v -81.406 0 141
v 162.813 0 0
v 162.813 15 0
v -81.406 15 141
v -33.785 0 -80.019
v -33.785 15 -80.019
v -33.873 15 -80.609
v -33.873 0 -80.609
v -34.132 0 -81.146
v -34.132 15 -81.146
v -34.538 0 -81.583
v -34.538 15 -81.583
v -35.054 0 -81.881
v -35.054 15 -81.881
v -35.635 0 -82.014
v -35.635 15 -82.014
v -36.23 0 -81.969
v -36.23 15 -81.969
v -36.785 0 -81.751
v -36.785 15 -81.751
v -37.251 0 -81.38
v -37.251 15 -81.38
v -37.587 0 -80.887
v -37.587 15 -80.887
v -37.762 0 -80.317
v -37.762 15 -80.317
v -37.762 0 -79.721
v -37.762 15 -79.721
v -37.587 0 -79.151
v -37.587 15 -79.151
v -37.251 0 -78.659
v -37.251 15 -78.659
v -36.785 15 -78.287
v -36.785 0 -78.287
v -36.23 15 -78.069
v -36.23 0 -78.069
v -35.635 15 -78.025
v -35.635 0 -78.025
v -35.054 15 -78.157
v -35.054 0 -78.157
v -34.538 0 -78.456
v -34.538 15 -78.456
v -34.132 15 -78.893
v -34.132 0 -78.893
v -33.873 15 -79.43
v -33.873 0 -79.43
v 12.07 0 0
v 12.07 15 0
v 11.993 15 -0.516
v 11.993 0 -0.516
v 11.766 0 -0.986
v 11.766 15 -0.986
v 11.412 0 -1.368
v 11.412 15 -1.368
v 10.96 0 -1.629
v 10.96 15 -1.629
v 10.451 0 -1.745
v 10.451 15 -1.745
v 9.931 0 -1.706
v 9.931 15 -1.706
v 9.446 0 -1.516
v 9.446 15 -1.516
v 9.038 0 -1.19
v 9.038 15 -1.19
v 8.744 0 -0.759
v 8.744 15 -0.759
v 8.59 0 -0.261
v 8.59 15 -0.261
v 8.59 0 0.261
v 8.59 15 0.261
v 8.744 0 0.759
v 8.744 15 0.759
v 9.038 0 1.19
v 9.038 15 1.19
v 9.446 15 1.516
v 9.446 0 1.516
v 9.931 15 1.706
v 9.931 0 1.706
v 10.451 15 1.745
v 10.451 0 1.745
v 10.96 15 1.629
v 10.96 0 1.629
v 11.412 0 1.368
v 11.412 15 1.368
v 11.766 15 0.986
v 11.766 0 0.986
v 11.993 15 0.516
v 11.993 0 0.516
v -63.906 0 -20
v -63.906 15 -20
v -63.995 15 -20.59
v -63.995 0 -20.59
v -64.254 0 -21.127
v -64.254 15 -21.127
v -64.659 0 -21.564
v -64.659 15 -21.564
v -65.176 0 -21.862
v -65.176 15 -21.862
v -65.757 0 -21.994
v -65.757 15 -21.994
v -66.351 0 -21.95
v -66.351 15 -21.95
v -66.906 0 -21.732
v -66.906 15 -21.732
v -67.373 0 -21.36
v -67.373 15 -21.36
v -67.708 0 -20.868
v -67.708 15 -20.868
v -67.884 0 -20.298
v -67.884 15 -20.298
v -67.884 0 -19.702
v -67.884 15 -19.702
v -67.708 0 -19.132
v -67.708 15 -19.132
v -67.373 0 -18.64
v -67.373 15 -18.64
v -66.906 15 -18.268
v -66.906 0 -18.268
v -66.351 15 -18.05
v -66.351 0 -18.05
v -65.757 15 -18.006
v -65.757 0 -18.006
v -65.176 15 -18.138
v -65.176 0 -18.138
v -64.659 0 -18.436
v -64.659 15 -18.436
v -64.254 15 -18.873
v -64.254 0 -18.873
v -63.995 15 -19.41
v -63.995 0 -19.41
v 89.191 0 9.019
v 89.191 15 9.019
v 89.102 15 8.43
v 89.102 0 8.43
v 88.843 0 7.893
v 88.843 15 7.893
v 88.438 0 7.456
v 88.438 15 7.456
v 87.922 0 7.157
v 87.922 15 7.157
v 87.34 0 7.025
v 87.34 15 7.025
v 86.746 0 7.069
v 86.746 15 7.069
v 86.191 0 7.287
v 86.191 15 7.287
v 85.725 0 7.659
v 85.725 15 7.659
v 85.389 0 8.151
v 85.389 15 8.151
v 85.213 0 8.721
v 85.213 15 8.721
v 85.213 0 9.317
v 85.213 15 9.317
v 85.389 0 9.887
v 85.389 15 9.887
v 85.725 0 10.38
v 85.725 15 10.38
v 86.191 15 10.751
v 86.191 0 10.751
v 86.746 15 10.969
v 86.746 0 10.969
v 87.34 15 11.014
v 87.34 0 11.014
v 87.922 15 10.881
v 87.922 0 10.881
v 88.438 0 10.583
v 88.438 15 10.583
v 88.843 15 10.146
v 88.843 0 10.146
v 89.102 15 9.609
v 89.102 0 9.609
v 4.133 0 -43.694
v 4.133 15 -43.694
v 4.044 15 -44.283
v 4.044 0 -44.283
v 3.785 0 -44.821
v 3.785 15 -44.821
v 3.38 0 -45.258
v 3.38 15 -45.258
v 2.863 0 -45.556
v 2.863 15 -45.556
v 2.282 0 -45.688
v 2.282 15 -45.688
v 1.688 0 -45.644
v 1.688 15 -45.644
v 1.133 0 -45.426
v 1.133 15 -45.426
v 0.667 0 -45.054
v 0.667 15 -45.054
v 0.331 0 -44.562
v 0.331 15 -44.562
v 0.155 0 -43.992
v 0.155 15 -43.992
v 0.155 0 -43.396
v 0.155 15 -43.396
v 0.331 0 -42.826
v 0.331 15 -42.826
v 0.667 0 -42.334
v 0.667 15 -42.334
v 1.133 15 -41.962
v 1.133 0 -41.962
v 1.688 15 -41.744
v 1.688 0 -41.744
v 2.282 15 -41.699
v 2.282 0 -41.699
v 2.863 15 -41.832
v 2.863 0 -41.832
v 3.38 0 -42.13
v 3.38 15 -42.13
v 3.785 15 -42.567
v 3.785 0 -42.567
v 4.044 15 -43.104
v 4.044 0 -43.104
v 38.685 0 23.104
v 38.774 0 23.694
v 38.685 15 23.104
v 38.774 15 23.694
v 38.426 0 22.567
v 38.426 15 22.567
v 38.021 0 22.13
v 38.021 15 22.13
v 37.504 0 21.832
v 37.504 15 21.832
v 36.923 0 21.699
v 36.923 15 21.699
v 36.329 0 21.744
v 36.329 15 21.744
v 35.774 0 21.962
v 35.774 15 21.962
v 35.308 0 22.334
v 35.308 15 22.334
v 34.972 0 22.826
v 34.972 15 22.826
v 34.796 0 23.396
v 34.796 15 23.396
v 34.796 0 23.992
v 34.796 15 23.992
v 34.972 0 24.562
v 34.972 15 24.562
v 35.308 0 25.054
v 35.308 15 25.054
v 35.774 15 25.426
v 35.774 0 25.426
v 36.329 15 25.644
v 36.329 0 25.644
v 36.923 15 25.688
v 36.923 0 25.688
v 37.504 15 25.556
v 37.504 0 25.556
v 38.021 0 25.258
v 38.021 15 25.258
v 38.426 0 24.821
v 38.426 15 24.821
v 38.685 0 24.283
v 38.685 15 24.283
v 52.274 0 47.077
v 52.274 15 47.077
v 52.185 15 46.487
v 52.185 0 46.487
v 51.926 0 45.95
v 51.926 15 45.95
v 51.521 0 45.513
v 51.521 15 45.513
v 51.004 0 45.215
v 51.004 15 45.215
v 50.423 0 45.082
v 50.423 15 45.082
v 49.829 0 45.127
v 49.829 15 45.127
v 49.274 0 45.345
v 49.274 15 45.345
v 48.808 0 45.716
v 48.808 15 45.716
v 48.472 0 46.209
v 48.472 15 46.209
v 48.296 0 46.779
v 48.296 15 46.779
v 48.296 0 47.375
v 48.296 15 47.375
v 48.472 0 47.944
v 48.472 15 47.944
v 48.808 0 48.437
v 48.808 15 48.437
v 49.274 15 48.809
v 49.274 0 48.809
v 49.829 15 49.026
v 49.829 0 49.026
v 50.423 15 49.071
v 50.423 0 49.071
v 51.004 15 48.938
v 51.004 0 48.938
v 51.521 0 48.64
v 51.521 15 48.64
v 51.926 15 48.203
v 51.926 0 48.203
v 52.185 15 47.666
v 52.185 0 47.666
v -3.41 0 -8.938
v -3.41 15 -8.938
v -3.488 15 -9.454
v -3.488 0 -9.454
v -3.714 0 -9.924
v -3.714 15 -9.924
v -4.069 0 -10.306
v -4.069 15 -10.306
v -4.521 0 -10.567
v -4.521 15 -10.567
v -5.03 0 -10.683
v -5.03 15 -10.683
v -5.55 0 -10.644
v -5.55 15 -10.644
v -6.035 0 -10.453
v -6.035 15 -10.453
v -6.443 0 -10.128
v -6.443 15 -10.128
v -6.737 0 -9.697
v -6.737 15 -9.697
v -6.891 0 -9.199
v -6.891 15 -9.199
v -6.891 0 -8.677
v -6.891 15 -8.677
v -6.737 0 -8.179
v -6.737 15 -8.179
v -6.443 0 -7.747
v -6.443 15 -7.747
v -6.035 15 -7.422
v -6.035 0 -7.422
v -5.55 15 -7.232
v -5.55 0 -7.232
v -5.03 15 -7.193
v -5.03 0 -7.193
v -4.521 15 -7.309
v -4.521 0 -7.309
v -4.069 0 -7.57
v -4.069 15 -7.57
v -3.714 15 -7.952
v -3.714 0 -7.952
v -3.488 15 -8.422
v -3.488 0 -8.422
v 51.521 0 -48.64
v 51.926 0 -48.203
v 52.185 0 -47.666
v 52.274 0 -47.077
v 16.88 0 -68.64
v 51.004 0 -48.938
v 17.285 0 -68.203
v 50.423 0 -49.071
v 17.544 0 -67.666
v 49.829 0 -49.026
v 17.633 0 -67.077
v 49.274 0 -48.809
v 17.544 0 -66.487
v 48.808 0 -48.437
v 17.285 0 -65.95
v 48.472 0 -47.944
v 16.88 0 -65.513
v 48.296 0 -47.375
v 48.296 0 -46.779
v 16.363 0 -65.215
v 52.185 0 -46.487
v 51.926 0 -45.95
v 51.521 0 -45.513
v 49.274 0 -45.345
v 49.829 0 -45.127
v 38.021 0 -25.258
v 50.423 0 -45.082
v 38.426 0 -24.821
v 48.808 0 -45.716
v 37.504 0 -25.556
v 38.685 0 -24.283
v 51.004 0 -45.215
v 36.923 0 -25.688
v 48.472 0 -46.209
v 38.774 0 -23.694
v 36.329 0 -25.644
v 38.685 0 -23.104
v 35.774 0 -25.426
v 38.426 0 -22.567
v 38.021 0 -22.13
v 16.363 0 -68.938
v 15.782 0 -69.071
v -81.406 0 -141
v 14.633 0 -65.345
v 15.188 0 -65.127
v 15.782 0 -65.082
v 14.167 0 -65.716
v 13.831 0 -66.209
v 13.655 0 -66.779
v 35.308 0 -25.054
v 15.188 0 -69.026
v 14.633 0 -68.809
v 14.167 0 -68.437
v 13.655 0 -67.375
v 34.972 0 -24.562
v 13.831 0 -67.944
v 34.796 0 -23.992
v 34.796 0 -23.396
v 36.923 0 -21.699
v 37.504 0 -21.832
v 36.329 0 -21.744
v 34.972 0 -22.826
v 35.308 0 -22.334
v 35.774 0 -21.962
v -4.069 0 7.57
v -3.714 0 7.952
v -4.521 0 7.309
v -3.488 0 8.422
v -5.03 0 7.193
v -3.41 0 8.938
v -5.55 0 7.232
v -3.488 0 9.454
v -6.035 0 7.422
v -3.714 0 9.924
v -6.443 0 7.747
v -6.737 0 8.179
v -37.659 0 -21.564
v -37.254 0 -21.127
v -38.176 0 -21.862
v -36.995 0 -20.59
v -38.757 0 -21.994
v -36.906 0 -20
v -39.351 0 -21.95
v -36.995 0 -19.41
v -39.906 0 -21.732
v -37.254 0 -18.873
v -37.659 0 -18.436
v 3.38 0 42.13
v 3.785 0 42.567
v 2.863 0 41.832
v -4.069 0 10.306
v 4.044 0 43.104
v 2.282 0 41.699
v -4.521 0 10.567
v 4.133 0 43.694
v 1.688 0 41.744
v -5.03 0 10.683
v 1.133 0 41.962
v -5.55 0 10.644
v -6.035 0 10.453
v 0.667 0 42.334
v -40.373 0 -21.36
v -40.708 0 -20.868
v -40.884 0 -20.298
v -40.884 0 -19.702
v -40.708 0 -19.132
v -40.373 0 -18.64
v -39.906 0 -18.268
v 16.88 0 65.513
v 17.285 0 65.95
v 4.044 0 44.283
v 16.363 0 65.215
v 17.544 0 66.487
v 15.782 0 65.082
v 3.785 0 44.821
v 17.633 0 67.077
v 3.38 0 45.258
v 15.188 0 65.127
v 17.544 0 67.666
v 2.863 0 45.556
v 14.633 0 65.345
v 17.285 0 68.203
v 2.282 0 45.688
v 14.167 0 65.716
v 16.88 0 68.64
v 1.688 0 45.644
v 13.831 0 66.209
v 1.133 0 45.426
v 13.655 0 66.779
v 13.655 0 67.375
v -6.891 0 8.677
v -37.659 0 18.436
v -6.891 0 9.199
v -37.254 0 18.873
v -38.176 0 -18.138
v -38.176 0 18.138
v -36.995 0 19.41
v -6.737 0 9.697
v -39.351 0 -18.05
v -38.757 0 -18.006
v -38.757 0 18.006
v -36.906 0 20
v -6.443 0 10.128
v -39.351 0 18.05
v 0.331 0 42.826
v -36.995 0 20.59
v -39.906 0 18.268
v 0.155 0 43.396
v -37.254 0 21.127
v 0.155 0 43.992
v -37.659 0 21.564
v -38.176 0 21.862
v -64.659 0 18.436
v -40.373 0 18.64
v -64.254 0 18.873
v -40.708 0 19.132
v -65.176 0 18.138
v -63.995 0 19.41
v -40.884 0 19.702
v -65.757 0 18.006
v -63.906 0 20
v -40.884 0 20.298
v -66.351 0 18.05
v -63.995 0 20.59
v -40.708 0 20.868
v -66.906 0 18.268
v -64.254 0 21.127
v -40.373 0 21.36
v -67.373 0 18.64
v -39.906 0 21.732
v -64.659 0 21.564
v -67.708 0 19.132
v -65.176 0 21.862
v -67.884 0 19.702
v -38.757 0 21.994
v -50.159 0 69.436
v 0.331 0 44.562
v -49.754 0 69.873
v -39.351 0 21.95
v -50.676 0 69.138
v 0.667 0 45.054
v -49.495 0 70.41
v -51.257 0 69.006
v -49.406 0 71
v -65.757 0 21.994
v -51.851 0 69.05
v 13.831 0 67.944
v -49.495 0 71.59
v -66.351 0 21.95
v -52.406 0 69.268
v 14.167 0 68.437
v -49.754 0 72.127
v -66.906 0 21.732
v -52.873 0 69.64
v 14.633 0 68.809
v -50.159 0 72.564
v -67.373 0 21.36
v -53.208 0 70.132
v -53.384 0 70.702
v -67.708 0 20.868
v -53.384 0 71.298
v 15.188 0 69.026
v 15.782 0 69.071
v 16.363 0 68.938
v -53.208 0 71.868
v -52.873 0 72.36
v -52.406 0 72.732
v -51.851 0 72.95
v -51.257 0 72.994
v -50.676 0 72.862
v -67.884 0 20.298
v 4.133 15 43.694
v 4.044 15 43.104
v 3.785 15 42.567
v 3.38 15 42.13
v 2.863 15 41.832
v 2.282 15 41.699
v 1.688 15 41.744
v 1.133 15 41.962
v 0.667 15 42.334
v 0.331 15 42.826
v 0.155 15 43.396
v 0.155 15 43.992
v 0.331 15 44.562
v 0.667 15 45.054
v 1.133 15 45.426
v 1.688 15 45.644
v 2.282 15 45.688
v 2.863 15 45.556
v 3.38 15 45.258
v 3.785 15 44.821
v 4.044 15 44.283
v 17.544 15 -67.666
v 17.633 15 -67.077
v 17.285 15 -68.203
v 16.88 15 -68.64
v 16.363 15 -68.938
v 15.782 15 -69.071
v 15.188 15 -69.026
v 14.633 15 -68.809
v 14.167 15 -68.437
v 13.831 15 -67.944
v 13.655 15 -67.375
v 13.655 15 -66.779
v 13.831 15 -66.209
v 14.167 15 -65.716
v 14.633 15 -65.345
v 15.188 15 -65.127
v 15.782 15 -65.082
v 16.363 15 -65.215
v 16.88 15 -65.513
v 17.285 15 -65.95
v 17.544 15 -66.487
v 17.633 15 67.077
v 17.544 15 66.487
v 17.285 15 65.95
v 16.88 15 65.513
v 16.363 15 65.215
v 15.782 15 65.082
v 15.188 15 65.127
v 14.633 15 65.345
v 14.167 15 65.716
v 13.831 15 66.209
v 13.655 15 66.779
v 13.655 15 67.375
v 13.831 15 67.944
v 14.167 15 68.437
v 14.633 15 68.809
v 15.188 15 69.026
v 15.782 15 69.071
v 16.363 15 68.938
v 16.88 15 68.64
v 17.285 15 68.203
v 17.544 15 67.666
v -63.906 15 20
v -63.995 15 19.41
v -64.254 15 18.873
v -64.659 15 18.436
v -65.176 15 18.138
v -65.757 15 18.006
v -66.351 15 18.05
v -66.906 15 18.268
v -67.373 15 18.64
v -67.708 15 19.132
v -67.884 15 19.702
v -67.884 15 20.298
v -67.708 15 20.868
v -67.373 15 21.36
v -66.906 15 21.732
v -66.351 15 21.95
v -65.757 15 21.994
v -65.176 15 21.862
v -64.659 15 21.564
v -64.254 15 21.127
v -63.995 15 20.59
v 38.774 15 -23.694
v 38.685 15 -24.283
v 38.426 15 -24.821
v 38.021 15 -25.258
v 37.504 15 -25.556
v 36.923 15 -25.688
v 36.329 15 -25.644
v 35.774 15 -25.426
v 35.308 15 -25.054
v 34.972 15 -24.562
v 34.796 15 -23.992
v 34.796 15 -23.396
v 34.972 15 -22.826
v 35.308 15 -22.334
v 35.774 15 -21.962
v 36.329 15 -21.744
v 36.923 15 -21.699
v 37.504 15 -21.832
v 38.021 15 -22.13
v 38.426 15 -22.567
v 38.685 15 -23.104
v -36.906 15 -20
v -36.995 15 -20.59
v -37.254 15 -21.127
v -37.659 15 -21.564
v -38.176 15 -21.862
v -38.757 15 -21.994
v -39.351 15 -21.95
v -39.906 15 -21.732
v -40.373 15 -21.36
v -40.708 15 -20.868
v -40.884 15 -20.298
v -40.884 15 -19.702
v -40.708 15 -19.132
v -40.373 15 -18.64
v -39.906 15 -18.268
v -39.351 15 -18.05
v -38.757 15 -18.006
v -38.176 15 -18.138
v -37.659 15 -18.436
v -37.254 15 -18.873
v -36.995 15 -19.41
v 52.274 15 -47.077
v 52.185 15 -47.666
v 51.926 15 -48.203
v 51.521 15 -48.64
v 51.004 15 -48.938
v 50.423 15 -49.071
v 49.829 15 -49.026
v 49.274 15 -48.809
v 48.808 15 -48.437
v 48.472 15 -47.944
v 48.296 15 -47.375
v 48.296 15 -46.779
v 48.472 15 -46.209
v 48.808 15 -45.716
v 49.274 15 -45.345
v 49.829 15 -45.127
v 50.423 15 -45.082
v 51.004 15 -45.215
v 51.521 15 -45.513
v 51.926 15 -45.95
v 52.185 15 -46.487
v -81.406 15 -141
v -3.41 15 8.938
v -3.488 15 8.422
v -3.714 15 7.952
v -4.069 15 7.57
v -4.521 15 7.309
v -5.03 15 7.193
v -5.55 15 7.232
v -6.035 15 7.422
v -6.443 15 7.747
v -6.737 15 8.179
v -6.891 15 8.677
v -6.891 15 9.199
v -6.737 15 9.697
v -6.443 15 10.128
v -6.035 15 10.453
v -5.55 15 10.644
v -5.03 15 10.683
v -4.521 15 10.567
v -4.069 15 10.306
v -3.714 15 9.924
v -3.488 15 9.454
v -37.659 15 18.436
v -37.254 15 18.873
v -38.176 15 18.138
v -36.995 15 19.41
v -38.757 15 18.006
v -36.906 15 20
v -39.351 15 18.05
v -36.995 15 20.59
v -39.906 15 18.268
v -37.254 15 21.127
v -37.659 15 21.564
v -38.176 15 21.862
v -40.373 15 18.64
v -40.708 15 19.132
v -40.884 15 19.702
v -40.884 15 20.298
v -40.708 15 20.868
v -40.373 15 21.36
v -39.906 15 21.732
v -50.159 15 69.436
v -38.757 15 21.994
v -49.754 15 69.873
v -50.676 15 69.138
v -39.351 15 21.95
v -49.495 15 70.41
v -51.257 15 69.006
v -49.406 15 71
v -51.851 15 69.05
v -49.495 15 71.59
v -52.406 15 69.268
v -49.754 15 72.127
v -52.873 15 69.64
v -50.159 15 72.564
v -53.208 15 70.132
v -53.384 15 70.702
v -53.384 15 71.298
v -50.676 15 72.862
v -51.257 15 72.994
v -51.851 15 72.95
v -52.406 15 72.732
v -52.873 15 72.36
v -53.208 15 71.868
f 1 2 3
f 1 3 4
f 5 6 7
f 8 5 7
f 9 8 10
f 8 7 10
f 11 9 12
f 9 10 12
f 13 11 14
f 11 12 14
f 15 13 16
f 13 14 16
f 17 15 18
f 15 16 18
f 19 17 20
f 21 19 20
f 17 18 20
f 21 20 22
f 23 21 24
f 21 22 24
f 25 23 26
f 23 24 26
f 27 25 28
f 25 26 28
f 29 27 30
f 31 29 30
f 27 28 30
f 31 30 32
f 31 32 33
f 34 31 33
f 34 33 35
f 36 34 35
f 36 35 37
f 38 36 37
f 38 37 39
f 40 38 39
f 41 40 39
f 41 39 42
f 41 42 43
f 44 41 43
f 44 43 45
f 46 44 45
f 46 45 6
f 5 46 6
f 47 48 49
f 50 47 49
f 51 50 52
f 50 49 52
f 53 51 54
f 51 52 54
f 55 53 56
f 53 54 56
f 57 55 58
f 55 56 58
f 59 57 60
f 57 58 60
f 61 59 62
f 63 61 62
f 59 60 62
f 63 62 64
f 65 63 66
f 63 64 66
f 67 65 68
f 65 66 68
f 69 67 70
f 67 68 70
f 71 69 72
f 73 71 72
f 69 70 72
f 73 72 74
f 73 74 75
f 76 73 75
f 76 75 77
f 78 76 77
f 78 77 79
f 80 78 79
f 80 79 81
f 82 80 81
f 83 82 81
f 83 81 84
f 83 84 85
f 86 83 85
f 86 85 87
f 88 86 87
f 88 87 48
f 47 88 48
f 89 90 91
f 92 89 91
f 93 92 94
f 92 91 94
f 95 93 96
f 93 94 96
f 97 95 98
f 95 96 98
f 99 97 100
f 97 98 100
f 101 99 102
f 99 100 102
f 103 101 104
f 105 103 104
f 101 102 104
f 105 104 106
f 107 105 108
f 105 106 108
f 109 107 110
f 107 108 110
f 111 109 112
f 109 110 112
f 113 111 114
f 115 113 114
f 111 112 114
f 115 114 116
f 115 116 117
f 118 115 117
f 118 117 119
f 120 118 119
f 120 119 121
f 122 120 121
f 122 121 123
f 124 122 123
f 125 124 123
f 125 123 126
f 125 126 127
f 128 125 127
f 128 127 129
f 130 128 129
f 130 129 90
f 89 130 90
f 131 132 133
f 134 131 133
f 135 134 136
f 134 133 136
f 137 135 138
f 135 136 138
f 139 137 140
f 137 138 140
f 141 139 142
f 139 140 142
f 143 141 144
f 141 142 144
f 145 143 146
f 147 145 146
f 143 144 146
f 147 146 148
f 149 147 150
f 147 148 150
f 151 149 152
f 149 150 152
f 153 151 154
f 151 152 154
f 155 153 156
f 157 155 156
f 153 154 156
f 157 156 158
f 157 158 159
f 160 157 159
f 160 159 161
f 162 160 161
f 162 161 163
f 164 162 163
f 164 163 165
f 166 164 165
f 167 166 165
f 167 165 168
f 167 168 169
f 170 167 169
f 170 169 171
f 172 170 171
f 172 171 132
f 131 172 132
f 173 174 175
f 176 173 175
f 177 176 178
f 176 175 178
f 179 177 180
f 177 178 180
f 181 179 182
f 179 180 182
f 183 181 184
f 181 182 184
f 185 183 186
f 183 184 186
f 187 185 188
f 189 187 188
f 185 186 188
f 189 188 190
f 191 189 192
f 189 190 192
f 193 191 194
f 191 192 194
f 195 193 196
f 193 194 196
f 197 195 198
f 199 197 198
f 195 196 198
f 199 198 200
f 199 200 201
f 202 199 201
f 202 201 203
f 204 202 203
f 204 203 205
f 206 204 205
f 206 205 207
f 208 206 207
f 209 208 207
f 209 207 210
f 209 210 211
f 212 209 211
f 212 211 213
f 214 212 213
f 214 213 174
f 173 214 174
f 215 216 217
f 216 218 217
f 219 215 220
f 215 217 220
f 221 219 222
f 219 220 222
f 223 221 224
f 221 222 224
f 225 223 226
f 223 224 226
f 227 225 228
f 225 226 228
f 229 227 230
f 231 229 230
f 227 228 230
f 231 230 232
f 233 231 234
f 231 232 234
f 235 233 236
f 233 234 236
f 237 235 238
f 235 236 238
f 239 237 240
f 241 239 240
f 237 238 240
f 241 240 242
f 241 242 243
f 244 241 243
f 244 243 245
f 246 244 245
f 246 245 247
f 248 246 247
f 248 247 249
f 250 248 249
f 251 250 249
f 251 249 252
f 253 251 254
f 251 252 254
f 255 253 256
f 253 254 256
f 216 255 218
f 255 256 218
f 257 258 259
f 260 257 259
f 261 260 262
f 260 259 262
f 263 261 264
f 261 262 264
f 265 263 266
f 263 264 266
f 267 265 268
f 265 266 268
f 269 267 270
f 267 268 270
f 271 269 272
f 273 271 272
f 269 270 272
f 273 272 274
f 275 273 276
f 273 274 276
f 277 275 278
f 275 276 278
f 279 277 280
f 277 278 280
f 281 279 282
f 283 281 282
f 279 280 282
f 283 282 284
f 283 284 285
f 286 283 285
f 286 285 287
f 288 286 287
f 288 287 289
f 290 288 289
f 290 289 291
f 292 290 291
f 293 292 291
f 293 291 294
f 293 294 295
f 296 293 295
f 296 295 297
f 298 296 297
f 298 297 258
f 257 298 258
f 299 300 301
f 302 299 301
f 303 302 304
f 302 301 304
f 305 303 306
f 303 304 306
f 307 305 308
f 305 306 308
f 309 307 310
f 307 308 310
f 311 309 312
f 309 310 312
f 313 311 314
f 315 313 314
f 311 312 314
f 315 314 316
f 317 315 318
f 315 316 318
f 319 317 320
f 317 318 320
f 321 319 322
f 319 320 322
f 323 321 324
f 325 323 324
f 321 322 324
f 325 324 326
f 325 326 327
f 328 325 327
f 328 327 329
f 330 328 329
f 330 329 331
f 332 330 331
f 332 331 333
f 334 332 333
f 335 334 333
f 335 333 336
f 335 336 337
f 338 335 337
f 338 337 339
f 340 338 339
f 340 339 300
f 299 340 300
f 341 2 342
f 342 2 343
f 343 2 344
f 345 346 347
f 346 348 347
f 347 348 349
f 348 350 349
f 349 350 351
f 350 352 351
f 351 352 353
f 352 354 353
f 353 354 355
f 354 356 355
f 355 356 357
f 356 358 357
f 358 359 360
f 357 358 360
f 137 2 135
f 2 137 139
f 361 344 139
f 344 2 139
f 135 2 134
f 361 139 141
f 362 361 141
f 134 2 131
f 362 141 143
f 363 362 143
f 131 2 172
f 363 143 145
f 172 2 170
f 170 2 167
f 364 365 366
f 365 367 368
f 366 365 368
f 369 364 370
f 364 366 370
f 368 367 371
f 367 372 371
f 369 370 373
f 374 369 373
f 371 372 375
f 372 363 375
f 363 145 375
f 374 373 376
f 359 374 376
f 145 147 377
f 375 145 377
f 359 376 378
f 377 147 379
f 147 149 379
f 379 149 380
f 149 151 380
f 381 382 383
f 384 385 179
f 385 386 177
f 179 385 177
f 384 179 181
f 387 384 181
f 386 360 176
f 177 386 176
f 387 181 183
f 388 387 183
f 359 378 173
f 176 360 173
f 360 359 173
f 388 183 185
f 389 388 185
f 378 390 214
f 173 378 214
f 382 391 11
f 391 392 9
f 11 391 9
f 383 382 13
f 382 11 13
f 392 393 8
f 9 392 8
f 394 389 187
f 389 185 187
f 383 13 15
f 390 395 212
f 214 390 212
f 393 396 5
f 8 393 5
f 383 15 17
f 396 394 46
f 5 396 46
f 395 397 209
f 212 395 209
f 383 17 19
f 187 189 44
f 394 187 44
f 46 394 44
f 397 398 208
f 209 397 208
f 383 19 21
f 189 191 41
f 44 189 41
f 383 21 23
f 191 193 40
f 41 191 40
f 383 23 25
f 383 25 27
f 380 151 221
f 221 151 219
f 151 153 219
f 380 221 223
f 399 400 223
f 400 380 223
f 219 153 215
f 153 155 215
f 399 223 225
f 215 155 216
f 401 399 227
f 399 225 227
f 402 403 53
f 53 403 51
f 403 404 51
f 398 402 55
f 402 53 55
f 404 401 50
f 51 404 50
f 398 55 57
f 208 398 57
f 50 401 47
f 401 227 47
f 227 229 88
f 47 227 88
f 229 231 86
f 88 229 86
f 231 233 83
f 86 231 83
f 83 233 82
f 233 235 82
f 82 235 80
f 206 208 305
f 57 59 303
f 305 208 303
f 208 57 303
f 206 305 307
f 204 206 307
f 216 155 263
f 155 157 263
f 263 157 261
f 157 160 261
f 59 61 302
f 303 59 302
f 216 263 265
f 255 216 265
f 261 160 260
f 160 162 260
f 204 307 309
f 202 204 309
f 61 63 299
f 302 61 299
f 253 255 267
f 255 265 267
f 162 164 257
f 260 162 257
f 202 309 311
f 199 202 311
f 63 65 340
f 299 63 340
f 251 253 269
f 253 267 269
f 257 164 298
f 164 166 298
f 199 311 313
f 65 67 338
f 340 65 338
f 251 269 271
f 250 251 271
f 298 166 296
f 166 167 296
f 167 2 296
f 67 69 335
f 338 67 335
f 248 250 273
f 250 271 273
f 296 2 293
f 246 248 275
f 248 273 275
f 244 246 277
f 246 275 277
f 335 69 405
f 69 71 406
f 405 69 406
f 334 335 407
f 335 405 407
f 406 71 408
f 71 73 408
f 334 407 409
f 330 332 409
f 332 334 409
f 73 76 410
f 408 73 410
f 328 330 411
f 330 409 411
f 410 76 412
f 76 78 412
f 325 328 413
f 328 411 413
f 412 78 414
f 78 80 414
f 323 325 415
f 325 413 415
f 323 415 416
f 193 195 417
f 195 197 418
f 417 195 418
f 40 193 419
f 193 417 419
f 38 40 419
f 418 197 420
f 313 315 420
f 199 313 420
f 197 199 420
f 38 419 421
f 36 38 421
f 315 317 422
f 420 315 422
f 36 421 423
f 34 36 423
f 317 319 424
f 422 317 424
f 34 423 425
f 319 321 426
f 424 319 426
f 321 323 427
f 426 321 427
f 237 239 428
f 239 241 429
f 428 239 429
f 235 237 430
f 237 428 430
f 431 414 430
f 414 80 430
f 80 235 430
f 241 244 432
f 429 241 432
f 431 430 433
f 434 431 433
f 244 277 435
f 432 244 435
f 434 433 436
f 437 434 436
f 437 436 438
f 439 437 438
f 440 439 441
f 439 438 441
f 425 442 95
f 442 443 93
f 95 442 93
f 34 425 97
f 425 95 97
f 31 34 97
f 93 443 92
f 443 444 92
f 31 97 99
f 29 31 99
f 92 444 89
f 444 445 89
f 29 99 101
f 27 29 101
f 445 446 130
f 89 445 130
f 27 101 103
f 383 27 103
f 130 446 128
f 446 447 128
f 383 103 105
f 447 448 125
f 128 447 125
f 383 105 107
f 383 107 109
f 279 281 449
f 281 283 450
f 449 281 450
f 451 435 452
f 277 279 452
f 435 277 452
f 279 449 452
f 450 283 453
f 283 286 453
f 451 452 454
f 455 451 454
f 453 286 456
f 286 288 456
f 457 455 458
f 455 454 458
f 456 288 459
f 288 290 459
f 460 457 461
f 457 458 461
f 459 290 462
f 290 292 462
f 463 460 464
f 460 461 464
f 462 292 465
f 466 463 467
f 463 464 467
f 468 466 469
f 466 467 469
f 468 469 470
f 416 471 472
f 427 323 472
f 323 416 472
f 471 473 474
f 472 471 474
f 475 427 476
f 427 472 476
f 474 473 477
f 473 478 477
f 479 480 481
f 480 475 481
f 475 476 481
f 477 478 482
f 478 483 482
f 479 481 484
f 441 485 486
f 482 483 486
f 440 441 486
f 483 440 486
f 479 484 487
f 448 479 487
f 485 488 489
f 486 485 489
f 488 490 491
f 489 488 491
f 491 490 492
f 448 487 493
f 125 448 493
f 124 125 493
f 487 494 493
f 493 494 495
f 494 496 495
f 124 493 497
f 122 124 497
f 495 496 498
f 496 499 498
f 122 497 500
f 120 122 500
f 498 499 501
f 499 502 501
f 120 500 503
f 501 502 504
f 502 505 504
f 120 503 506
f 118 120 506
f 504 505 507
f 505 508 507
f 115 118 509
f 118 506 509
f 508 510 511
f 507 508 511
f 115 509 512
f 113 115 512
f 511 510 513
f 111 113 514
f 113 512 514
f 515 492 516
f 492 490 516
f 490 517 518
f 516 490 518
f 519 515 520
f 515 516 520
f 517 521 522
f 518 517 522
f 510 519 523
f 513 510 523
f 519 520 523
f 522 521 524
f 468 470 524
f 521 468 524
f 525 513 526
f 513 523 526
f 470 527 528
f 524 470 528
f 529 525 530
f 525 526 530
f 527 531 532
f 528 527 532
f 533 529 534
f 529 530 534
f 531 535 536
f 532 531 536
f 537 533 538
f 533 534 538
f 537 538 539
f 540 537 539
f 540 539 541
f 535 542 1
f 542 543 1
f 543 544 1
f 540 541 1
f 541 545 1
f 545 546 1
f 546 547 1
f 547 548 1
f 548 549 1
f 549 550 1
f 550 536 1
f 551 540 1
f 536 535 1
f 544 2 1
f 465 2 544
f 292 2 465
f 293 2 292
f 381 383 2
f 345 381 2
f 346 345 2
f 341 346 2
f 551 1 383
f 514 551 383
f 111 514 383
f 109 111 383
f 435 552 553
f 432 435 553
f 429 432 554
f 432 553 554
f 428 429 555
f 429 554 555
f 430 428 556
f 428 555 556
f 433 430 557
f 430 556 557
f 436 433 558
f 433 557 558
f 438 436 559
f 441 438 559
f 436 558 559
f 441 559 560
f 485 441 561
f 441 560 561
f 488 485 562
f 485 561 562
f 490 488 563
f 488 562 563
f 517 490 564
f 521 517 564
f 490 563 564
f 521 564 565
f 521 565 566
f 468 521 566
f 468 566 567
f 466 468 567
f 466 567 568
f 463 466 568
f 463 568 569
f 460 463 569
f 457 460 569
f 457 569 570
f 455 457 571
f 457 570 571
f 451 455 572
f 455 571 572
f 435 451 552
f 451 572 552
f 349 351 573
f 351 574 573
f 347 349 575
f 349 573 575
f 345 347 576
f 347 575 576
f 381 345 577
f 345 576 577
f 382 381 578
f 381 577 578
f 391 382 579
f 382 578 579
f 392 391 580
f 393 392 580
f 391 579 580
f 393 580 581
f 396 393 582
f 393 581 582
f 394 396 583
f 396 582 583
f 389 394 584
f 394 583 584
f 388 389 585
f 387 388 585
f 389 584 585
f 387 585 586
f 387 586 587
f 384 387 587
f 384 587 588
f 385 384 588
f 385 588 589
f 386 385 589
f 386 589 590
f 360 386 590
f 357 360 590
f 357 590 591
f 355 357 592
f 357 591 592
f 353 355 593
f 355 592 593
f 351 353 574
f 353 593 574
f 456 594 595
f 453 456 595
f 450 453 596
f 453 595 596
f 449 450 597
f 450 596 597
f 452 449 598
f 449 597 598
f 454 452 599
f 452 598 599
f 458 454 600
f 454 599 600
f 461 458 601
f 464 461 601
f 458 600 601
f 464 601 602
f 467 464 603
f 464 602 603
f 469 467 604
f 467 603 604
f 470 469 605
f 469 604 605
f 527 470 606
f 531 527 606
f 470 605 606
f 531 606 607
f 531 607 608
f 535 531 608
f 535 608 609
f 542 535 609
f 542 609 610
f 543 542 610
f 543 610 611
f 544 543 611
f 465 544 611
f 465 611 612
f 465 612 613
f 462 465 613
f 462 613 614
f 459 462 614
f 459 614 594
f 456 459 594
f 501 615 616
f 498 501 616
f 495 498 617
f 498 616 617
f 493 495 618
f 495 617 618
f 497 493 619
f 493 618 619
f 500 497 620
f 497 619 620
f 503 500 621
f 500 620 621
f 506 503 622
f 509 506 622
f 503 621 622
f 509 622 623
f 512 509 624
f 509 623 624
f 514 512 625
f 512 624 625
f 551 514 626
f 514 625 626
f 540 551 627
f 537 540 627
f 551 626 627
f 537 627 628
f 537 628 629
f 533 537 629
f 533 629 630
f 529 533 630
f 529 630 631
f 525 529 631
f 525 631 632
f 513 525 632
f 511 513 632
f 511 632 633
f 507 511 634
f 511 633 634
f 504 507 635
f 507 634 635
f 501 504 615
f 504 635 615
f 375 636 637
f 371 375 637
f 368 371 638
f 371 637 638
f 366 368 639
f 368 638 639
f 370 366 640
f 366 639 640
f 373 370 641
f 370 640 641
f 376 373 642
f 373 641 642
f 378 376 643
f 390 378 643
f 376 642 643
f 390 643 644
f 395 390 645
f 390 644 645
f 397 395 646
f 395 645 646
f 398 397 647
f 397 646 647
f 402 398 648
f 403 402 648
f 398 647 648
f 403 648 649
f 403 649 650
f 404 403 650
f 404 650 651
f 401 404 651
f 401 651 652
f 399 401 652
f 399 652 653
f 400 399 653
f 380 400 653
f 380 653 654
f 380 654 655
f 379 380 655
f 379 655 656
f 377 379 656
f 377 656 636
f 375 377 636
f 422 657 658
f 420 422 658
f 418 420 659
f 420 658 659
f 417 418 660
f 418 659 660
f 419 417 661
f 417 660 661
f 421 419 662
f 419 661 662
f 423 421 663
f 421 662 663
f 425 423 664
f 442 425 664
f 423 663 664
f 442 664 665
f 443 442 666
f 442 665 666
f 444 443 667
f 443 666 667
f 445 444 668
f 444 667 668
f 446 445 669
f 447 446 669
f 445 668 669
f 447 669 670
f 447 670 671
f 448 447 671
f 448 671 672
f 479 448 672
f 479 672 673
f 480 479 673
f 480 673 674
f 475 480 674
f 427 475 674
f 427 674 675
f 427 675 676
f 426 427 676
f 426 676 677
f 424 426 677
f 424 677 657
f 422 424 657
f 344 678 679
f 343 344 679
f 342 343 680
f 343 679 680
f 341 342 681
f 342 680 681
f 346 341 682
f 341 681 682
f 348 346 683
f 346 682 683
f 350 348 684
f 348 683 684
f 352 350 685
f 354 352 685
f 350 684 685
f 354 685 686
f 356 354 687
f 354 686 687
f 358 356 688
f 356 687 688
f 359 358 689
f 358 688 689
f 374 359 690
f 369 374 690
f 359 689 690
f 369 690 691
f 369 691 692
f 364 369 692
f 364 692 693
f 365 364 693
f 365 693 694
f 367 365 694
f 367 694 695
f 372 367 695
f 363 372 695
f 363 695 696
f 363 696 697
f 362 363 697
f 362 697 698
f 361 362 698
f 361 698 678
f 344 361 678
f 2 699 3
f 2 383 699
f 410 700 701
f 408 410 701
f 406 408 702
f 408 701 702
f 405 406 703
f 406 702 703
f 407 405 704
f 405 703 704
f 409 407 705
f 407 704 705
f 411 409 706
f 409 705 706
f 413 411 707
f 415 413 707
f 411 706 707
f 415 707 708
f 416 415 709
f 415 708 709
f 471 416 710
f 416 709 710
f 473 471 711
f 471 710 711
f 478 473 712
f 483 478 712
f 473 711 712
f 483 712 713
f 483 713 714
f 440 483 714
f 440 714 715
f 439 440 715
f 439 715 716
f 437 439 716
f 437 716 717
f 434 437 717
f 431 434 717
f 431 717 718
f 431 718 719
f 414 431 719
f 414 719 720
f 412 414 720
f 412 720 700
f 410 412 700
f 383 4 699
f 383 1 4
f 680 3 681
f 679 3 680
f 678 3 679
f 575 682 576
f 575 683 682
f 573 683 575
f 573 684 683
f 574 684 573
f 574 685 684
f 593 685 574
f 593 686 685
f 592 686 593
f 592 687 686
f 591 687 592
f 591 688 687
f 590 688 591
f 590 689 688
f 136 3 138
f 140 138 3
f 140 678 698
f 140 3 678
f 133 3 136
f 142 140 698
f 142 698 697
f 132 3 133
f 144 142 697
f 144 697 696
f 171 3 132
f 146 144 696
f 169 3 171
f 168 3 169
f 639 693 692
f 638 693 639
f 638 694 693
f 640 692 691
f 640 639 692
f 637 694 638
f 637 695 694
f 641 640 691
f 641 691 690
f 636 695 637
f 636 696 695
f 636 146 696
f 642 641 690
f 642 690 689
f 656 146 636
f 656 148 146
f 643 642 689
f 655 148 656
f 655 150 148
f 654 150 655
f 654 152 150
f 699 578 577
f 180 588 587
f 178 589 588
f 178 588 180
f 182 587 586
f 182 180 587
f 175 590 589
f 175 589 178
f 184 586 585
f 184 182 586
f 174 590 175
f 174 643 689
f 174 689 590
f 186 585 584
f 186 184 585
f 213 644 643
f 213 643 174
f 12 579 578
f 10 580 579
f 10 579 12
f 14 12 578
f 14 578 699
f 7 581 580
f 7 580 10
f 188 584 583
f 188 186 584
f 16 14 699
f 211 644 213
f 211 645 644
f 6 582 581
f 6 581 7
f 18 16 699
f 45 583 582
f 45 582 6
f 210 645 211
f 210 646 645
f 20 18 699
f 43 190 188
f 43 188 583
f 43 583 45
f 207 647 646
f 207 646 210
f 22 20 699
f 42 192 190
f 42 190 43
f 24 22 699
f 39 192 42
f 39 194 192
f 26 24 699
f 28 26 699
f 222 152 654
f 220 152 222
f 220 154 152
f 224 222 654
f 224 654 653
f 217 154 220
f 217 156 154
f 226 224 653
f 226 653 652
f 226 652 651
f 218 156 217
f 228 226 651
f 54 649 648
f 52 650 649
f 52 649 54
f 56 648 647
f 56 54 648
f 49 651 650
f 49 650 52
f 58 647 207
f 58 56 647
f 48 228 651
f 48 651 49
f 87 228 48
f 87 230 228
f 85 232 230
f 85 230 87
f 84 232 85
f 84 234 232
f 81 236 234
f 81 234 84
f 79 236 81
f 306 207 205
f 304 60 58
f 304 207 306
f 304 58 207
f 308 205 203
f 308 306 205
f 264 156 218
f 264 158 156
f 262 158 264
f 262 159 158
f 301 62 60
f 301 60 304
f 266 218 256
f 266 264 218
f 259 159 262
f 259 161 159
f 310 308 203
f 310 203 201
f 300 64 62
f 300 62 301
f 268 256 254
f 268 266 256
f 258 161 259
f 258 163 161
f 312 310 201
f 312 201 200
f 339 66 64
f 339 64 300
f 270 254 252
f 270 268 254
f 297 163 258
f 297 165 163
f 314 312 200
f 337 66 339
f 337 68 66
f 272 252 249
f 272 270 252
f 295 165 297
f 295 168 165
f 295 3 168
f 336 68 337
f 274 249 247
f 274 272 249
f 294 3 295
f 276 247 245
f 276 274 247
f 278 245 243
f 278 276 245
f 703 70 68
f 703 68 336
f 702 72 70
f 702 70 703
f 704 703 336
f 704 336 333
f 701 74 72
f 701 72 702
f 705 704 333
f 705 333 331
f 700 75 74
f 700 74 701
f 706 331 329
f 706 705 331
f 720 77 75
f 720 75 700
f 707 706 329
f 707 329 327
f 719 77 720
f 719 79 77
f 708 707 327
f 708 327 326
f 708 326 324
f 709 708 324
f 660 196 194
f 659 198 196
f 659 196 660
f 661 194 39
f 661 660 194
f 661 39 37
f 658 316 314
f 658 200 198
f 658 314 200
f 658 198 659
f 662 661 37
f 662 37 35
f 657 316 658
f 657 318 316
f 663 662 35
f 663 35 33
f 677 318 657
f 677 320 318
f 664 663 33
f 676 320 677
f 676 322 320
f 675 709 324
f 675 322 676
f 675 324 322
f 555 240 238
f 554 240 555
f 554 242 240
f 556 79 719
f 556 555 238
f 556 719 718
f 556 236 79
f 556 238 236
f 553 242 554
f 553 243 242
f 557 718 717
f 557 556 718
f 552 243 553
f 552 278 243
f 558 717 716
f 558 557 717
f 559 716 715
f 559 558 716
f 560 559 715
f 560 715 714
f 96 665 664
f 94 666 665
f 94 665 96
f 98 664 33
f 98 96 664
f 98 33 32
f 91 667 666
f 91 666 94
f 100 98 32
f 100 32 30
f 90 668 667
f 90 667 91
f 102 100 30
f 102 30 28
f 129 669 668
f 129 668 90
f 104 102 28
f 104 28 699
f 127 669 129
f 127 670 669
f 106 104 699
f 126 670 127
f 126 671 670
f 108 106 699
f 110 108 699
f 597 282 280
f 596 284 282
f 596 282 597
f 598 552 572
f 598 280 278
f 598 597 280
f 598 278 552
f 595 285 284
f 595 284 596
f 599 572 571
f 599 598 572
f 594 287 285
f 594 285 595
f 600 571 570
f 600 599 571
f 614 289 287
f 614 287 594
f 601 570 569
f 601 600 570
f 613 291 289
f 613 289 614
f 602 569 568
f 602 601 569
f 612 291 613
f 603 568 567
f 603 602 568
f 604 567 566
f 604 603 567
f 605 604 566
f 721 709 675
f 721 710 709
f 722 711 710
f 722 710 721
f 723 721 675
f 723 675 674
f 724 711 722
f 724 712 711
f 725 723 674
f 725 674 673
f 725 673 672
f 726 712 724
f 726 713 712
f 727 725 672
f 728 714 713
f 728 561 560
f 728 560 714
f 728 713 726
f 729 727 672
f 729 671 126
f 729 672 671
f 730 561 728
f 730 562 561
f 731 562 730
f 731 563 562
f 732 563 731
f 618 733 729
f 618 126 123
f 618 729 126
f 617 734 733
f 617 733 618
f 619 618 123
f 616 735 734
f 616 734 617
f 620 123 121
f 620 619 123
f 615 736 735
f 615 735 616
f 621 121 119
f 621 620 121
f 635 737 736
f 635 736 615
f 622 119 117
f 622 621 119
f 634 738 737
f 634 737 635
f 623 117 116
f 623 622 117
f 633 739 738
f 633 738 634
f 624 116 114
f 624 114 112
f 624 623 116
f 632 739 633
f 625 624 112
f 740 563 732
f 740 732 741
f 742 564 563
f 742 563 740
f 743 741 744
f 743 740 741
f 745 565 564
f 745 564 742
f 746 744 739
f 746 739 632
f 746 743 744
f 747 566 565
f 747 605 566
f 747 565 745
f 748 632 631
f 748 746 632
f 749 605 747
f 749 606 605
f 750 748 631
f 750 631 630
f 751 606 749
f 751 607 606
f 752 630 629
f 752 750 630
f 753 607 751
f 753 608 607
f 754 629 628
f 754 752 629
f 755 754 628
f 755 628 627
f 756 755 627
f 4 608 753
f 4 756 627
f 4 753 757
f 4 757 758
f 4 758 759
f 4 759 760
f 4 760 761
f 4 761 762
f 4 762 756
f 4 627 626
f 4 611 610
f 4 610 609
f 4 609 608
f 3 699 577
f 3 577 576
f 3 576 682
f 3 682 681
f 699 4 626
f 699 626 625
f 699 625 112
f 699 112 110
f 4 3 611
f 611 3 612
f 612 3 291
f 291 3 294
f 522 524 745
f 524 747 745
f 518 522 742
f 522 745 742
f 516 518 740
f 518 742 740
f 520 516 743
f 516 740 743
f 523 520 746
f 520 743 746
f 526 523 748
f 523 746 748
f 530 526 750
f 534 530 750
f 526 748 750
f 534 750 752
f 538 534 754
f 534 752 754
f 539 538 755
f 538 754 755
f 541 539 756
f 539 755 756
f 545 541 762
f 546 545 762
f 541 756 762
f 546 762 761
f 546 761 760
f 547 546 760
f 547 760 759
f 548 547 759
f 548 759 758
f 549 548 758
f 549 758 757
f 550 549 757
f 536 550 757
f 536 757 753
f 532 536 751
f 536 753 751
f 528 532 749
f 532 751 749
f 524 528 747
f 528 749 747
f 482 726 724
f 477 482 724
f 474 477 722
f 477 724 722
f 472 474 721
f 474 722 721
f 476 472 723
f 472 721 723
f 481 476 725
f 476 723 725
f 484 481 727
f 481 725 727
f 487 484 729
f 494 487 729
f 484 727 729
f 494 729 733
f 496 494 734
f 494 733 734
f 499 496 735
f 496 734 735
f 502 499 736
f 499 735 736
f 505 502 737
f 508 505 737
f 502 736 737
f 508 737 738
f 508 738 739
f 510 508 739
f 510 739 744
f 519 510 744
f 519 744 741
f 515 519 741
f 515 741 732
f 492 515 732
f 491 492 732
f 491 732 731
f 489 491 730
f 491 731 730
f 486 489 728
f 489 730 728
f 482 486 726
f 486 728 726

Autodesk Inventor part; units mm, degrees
ref_plane "YZ Plane" through (0, 0, 0) normal (1, 0, 0) x (0, 1, 0)
ref_plane "XZ Plane" through (0, 0, 0) normal (0, 1, 0) x (-1, 0, 0)
ref_plane "XY Plane" through (0, 0, 0) normal (0, 0, 1) x (1, 0, 0)
sketch "Sketch1" plane through (0, 0, 0) normal (0, 1, 0) x (-1, 0, 0)
  line L0 (0, 0) -> (-90, 0)
  line L1 (-162.8128, 0) -> (81.4064, 141)
  line L2 (81.4064, 141) -> (81.4064, -141)
  line L3 (81.4064, -141) -> (-162.8128, 0)
  dimension "d0" = 90
  dimension "d1" = 282
extrude "TriangleFace" add sketch "Sketch1" along normal blind 15
sketch "Sketch2" plane through (0, 15, 0) normal (0, 1, 0) x (1, 0, 0)
  line L0 (-81.4064, 141) -> (-81.4064, -141) projected
  line L1 (-81.4064, 0) -> (-65.9064, 0)
  line L2 (-65.9064, 0) -> (-65.9064, 20)
  line L3 (-65.9064, 0) -> (-65.9064, -20)
  line L4 (-65.9064, 0) -> (-38.9064, 0)
  line L5 (-38.9064, 0) -> (-38.9064, 20)
  line L6 (-38.9064, 0) -> (-38.9064, -20)
  circle A0 centre (-65.9064, 20) radius 2
  circle A1 centre (-38.9064, 20) radius 2
  circle A2 centre (-65.9064, -20) radius 2
  circle A3 centre (-38.9064, -20) radius 2
  point P0 (0, 0)
  dimension "d4" = 15.5
  dimension "d5" = 20
  dimension "d6" = 20
  dimension "d7" = 27
  dimension "d8" = 20
  dimension "d9" = 20
  dimension "d10" = 4
  dimension "d11" = 4
  dimension "d12" = 4
  dimension "d13" = 4
extrude "SideTwoHoles" cut sketch "Sketch2" against normal blind 15
sketch "Sketch3" plane through (0, 15, 0) normal (0, 1, 0) x (1, 0, 0)
  line L0 (162.8128, 0) -> (-81.4064, 141) projected
  line L1 (40.7032, 70.5) -> (32.9532, 57.0766)
  line L2 (32.9532, 57.0766) -> (19.4532, 33.6939)
  line L3 (32.9532, 57.0766) -> (15.6327, 67.0766)
  line L4 (32.9532, 57.0766) -> (50.2737, 47.0766)
  line L5 (19.4532, 33.6939) -> (2.1327, 43.6939)
  line L6 (19.4532, 33.6939) -> (36.7737, 23.6939)
  circle A0 centre (15.6327, 67.0766) radius 2
  circle A1 centre (50.2737, 47.0766) radius 2
  circle A2 centre (2.1327, 43.6939) radius 2
  circle A3 centre (36.7737, 23.6939) radius 2
  point P0 (0, 0)
  dimension "d16" = 15.5
  dimension "d17" = 27
  dimension "d18" = 20
  dimension "d19" = 20
  dimension "d20" = 20
  dimension "d21" = 20
  dimension "d22" = 4
  dimension "d23" = 4
  dimension "d24" = 4
  dimension "d25" = 4
extrude "SideOneHoles" cut sketch "Sketch3" against normal blind 15
sketch "Sketch4" plane through (0, 15, 0) normal (0, 1, 0) x (1, 0, 0)
  line L0 (-81.4064, -141) -> (162.8128, 0) projected
  line L1 (40.7032, -70.5) -> (32.9532, -57.0766)
  line L2 (32.9532, -57.0766) -> (19.4532, -33.6939)
  line L3 (19.4532, -33.6939) -> (36.7737, -23.6939)
  line L4 (19.4532, -33.6939) -> (2.1327, -43.6939)
  line L5 (32.9532, -57.0766) -> (50.2737, -47.0766)
  line L6 (32.9532, -57.0766) -> (15.6327, -67.0766)
  circle A0 centre (36.7737, -23.6939) radius 2
  circle A1 centre (2.1327, -43.6939) radius 2
  circle A2 centre (50.2737, -47.0766) radius 2
  circle A3 centre (15.6327, -67.0766) radius 2
  point P0 (0, 0)
  dimension "d28" = 15.5
  dimension "d29" = 27
  dimension "d30" = 20
  dimension "d31" = 20
  dimension "d32" = 20
  dimension "d33" = 20
  dimension "d34" = 4
  dimension "d35" = 4
  dimension "d36" = 4
  dimension "d37" = 4
extrude "SideThreeHoles" cut sketch "Sketch4" against normal blind 15
sketch "Sketch5" plane through (0, 15, 0) normal (0, 1, 0) x (1, 0, 0)
  line L0 (-81.4064, -141) -> (162.8128, 0) projected
  line L1 (162.8128, 0) -> (-81.4064, 141) projected
  line L2 (162.8128, 0) -> (-81.4064, 0)
  line L3 (-81.4064, 141) -> (-81.4064, -141) projected
  line L4 (17.3205, 0) -> (-8.6603, -15)
  line L5 (-8.6603, -15) -> (-8.6603, 15)
  line L6 (-8.6603, 15) -> (17.3205, 0)
  line L7 (-8.6603, 15) -> (-5.1603, 8.9378)
  line L8 (-8.6603, 15) -> (-1.6603, 15) construction
  circle A0 centre (-5.1603, 8.9378) radius 1.75
  line L9 (-8.6603, -15) -> (-5.1603, -8.9378)
  line L10 (-8.6603, -15) -> (-1.6603, -15) construction
  circle A1 centre (-5.1603, -8.9378) radius 1.75
  line L11 (17.3205, 0) -> (10.3205, 0)
  line L12 (17.3205, 0) -> (24.3205, 0) construction
  circle A2 centre (10.3205, 0) radius 1.75
  point P0 (0, 0)
  point P1 (0, 0)
  dimension "d40" = 30
  dimension "d43" = 7
  dimension "d44" = 60
  dimension "d45" = 3.5
  dimension "d46" = 7
  dimension "d47" = 60
  dimension "d48" = 3.5
  dimension "d49" = 7
  dimension "d50" = 180
  dimension "d51" = 3.5
extrude "CenterHoles" cut sketch "Sketch5" against normal blind 15 contours A1 | A0 | A2 L2 | L2 A2
sketch "Sketch6" plane through (0, 15, 0) normal (0, 1, 0) x (1, 0, 0)
  line L0 (-81.4064, -141) -> (162.8128, 0) projected
  line L1 (-81.4064, -141) -> (-81.4064, -71)
  line L2 (-81.4064, 141) -> (-81.4064, -141) projected
  line L3 (-81.4064, -71) -> (-51.4064, -71)
  line L4 (-81.4064, -71) -> (-51.4064, -71) construction
  circle A0 centre (-51.4064, -71) radius 2
  line L5 (162.8128, 0) -> (-81.4064, 141) projected
  line L6 (-81.4064, 141) -> (-20.7846, 106)
  line L7 (-20.7846, 106) -> (-35.7846, 80.0192)
  line L8 (162.8128, 0) -> (102.191, -35)
  line L9 (102.191, -35) -> (87.191, -9.0192)
  circle A1 centre (-35.7846, 80.0192) radius 2
  circle A2 centre (87.191, -9.0192) radius 2
  point P0 (0, 0)
  dimension "d54" = 70
  dimension "d55" = 30
  dimension "d56" = 0
  dimension "d57" = 4
  dimension "d60" = 70
  dimension "d61" = 30
  dimension "d62" = 70
  dimension "d63" = 30
  dimension "d64" = 4
  dimension "d65" = 4
extrude "Extrusion7" cut sketch "Sketch6" against normal blind 15 contours A2 | A1 | A0
properties part number "TraingleFifteen"
